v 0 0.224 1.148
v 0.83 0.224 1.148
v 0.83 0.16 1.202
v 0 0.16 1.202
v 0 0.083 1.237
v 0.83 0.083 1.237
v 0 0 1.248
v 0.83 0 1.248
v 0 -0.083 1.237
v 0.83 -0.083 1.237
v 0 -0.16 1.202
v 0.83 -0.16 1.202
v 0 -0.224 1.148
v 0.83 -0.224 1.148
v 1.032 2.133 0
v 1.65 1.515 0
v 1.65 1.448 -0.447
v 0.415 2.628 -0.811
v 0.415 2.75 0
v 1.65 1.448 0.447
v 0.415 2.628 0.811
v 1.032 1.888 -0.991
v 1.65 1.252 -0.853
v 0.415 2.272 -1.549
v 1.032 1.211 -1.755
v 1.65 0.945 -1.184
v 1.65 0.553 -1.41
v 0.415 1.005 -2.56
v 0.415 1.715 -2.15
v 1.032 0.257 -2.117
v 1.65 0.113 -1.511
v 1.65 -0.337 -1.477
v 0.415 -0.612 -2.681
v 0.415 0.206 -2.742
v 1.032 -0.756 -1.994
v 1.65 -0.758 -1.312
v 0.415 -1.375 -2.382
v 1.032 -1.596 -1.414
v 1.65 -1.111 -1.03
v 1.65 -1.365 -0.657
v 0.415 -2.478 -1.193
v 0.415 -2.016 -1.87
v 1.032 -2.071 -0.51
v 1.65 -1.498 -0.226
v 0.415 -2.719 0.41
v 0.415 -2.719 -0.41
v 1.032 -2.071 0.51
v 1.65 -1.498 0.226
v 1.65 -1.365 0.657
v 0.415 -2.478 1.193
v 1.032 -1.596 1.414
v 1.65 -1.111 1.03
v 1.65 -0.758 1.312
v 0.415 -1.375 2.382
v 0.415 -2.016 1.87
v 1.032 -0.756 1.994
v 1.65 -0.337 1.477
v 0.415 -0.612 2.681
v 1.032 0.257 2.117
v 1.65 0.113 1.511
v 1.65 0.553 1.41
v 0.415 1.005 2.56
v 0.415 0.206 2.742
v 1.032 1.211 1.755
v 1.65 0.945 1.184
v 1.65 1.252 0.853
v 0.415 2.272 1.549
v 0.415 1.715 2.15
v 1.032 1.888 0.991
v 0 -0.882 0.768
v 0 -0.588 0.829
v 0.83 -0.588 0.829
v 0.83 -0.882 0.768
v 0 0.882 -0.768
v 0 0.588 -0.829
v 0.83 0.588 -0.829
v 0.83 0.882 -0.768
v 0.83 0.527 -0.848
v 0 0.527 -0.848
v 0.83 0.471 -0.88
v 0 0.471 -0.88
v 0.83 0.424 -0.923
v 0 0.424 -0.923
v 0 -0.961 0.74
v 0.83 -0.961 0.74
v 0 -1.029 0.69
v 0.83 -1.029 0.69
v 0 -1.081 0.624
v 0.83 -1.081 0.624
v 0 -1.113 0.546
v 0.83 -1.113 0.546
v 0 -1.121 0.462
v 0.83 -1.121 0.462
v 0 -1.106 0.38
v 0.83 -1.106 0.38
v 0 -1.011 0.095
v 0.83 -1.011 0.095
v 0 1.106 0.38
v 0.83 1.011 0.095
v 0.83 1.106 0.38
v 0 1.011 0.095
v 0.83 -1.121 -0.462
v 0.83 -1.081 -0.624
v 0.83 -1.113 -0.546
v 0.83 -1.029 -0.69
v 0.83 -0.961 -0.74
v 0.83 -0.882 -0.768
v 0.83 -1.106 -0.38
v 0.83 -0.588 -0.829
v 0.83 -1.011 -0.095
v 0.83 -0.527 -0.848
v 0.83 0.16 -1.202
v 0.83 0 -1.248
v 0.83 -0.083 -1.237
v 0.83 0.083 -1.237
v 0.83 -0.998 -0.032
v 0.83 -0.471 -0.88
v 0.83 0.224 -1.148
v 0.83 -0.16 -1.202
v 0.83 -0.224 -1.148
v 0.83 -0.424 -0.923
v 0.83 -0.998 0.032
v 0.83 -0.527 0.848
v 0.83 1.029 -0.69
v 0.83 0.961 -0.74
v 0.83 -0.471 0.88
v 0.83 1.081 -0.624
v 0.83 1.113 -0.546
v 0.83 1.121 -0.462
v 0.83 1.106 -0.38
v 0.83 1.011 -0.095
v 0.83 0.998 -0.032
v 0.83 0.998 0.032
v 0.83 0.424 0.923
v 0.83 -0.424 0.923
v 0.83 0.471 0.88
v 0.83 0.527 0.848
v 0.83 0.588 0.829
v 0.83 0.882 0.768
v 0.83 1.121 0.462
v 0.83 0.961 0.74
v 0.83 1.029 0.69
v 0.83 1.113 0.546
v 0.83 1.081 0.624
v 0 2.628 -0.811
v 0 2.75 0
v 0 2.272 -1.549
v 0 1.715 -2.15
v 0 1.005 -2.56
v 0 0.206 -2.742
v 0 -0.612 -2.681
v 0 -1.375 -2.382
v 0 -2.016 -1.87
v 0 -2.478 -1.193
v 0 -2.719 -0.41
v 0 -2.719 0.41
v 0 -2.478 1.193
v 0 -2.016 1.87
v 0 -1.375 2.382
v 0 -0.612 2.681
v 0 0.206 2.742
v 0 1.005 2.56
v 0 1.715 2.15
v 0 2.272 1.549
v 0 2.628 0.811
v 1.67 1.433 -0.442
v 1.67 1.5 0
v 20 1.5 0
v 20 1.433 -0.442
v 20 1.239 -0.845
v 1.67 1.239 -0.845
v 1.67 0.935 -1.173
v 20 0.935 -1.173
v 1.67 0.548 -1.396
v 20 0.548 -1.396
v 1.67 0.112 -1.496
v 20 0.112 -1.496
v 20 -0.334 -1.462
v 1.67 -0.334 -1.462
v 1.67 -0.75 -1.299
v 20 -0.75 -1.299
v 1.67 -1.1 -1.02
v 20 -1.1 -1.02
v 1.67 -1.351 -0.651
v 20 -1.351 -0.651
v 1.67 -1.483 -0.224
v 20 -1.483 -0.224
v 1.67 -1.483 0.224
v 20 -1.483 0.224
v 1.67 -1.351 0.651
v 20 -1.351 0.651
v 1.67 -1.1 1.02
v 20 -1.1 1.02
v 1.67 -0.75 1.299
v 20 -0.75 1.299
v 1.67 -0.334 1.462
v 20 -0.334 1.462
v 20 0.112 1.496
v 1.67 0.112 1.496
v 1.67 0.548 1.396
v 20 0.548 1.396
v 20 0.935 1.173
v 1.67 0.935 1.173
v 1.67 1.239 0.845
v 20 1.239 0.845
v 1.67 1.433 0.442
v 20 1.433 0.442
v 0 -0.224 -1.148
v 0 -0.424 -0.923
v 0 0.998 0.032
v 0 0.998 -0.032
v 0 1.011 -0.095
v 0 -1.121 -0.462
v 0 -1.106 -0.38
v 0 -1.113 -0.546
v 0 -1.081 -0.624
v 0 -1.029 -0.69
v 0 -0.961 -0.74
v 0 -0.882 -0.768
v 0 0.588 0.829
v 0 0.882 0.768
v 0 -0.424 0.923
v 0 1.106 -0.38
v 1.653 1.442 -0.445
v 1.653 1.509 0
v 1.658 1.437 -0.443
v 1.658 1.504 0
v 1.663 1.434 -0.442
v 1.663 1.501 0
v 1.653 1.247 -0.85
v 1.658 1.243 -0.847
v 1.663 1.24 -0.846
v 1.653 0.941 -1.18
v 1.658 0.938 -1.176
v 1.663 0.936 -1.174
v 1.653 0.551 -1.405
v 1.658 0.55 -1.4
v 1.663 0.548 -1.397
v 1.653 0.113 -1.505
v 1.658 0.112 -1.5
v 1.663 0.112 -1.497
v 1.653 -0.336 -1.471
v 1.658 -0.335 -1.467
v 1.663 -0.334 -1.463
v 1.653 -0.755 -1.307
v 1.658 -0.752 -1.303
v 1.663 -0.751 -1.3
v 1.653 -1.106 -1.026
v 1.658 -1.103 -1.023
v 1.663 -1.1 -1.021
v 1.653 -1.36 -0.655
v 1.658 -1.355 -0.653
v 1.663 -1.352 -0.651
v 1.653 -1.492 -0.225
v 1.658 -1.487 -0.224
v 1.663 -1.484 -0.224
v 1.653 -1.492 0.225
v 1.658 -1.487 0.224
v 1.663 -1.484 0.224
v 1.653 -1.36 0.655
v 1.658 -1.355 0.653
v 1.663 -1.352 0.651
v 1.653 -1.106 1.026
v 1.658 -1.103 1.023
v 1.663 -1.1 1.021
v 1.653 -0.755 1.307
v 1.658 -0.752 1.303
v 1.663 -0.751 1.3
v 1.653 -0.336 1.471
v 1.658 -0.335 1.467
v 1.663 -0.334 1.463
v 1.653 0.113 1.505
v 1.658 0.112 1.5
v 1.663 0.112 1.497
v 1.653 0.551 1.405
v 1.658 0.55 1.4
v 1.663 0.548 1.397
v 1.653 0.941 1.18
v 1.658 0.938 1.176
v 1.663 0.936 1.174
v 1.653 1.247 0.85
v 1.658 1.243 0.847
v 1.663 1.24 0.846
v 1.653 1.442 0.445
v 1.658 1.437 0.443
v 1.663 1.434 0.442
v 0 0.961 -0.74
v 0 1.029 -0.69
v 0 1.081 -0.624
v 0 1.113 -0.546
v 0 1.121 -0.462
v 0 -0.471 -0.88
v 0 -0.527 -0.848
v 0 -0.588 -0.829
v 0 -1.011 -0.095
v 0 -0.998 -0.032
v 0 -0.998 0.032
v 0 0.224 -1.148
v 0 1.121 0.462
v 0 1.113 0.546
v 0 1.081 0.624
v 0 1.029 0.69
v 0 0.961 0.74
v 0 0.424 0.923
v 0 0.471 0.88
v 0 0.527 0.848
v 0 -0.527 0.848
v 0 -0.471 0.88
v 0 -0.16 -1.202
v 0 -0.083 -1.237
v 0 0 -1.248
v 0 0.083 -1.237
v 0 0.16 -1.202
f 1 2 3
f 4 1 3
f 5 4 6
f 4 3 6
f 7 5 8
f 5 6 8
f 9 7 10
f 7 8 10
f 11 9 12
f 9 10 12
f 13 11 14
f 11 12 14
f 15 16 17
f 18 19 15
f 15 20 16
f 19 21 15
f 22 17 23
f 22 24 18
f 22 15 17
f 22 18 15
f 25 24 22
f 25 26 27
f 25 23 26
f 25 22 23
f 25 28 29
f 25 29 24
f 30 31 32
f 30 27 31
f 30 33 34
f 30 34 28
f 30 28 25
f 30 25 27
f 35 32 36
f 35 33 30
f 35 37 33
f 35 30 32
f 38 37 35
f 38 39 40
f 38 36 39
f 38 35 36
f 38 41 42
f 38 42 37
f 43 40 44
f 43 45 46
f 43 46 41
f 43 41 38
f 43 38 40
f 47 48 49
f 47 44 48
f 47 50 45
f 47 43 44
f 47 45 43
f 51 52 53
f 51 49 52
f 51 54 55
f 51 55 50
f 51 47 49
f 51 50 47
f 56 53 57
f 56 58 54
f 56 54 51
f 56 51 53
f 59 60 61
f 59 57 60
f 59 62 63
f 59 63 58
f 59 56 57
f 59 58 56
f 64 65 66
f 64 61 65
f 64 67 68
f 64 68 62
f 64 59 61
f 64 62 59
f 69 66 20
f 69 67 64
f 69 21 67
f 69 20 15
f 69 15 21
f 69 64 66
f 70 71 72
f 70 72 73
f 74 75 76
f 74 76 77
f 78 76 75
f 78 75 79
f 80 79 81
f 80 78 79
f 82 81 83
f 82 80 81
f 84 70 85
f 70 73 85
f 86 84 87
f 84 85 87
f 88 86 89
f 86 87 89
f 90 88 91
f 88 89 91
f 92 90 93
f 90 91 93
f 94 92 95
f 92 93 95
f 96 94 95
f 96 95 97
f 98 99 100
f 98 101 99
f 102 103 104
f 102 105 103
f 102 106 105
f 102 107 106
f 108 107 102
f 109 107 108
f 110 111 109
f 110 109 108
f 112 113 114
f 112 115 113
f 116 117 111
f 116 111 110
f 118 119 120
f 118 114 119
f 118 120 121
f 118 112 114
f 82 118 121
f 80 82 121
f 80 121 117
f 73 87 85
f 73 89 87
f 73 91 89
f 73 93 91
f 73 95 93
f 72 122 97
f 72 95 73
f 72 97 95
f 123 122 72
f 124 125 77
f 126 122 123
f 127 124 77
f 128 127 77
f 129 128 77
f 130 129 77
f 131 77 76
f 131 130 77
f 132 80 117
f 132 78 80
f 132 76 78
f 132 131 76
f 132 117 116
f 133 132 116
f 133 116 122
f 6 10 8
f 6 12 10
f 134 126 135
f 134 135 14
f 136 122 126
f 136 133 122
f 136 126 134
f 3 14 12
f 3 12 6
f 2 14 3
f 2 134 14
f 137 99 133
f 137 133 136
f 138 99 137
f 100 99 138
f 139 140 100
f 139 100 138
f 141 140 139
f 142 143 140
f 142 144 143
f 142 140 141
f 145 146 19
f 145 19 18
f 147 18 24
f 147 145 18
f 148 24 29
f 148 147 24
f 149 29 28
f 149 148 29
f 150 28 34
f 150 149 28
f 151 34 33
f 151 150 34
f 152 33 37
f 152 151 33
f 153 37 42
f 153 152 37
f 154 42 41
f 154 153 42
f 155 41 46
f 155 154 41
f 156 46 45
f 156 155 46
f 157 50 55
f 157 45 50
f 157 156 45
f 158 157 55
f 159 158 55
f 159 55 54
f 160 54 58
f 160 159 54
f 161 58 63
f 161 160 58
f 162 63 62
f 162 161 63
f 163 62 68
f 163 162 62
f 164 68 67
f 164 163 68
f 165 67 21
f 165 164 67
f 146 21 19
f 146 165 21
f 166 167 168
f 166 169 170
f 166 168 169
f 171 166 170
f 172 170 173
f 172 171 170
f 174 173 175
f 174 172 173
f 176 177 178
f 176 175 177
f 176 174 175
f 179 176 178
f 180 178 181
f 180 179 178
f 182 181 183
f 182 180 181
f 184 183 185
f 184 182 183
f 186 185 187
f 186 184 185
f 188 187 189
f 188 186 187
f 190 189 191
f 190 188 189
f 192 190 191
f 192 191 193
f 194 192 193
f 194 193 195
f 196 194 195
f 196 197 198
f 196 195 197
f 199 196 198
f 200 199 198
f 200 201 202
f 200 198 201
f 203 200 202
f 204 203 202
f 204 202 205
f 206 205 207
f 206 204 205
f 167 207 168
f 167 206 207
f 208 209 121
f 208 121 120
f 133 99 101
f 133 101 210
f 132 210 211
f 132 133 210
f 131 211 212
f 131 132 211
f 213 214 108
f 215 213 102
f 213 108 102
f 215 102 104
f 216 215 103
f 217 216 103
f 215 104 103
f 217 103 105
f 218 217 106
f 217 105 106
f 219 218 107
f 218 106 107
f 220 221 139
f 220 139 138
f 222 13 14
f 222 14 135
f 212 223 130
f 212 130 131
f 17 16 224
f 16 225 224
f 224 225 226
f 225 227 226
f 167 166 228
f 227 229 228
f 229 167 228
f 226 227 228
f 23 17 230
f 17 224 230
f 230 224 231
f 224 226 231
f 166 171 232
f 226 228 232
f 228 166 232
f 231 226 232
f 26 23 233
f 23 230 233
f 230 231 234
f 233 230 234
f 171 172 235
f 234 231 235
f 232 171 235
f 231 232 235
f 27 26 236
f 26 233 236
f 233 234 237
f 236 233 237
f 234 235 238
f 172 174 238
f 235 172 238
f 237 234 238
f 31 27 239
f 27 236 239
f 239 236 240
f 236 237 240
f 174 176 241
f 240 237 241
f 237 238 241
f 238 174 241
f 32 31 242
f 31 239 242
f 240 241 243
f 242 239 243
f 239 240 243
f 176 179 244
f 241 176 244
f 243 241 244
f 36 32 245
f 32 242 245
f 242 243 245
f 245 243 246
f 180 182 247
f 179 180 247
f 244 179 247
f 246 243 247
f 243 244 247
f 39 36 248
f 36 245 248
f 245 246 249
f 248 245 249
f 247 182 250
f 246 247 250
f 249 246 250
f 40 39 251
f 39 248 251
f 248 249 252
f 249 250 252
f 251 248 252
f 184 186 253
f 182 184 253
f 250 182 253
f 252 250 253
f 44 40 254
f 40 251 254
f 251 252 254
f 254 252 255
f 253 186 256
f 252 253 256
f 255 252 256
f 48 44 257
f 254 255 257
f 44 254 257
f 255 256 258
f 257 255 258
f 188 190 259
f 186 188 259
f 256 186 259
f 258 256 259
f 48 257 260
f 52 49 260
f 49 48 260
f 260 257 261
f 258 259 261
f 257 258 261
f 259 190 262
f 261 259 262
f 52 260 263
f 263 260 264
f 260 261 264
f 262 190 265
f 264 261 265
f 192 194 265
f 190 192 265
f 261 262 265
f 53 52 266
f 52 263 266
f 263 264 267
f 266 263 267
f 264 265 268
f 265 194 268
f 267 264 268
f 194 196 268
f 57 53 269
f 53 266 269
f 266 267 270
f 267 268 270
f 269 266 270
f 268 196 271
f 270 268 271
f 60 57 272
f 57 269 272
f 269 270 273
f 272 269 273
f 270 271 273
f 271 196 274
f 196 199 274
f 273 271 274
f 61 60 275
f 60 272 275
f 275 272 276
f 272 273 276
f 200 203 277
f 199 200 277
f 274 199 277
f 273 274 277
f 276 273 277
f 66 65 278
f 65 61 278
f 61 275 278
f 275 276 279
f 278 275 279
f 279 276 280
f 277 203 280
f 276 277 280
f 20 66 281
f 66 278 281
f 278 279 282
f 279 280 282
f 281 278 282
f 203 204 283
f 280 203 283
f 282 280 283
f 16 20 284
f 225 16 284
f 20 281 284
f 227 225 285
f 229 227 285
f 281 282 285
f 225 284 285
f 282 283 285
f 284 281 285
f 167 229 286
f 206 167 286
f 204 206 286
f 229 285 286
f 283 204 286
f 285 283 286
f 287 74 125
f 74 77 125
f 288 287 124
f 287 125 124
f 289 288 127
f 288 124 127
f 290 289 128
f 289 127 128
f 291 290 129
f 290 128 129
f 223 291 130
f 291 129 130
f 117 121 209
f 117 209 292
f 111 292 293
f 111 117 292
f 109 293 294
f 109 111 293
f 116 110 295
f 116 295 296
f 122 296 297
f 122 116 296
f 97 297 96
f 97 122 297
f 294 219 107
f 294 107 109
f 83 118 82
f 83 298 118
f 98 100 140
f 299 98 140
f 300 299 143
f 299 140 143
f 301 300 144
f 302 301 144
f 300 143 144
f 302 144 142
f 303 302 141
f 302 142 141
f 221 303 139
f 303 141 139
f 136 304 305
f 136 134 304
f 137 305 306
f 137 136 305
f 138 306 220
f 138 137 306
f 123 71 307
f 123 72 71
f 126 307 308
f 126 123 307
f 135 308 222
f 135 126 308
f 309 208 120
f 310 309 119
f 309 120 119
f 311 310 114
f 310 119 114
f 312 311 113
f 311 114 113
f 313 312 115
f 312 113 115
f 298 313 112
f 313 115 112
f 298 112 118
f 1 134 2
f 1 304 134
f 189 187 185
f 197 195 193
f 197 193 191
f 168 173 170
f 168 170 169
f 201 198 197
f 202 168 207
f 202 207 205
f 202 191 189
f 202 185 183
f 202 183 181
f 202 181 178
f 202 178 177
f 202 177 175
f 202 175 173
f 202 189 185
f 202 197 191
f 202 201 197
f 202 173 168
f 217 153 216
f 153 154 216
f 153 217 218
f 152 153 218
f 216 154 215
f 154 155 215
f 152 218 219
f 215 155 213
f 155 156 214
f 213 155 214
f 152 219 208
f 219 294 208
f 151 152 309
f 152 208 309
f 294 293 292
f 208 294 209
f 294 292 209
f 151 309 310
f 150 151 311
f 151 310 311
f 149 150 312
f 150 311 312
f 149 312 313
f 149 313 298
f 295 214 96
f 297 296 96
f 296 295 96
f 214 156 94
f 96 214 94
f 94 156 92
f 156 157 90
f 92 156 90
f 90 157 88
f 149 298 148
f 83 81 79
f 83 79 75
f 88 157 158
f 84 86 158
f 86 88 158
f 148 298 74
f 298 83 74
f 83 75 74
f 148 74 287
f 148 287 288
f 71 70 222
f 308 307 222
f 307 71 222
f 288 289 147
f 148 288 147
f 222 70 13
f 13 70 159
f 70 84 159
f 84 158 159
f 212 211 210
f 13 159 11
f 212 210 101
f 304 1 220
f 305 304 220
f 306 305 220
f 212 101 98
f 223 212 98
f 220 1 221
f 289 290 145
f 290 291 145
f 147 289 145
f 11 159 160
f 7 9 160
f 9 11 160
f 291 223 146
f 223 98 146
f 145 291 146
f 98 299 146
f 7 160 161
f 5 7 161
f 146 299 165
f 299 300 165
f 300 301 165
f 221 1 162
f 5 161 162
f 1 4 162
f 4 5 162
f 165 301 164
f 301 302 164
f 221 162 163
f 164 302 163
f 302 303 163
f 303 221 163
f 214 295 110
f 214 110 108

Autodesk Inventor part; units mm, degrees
ref_plane "YZ Plane" through (0, 0, 0) normal (1, 0, 0) x (0, 1, 0)
ref_plane "XZ Plane" through (0, 0, 0) normal (0, 1, 0) x (-1, 0, 0)
ref_plane "XY Plane" through (0, 0, 0) normal (0, 0, 1) x (1, 0, 0)
sketch "Sketch1" plane through (0, 0, 0) normal (0, 0, 1) x (1, 0, 0)
  line L0 (0, 0) -> (20, 0)
  line L1 (20, 0) -> (20, 1.5)
  line L2 (20, 1.5) -> (2.35, 1.5)
  line L3 (2.35, 1.5) -> (2.15, 1.5)
  line L4 (2.15, 1.5) -> (1.67, 1.5)
  line L5 (1.65, 1.515) -> (1.65, 1.515)
  line L6 (1.65, 1.515) -> (0.415, 2.75)
  line L7 (0.415, 2.75) -> (0, 2.75)
  line L8 (0, 2.75) -> (0, 0)
  line L9 (1.65, 1.515) -> (1.65, 1.52)
  arc A0 (1.65, 1.52) -> (1.67, 1.5) centre (1.67, 1.52) ccw
  dimension "d17" = 20
  dimension "d18" = 0.415
  dimension "d19" = 1.65
  dimension "d20" = 0
  dimension "d21" = 5.5
  dimension "d22" = 3
  dimension "d23" = 3
  dimension "d25" = 45
  dimension "d26" = 0.2
  dimension "d28" = 0.02
  dimension "d29" = 17.65
  dimension "d30" = 0.02
  dimension "d52" = 0.7
revolve "Revolution1" add sketch "Sketch1" angle 360 about axis through (0, 0, 0) along (1, 0, 0)
thread "Thread1" size "M3x0.5" class "6g" standard "ISO Metric profile" length 17.65
sketch "Sketch2" plane through (0, 0, 0) normal (-1, 0, 0) x (0, 0, 1)
  circle A0 centre (0, 0) radius 1.4 construction
  circle A1 centre (0, 0) radius 0.98 construction
  line L0 (0, 0) -> (0.8487, 0.49)
  line L1 (0, 0) -> (0.98, 0) construction
  line L2 (0, 0) -> (0.8487, -0.49)
  line L3 (0, 0) -> (0.98, 0) construction
  line L4 (0.8487, 0.49) -> (1.4, 0)
  line L5 (1.4, 0) -> (0.8487, -0.49)
  dimension "d34" = 2.8
  dimension "d35" = 1.96
  dimension "d39" = 30
  dimension "d40" = 330
extrude "Extrusion1" cut sketch "Sketch2" against normal blind 0.83
pattern_circular "Circular Pattern1" count 6 over 360 about axis through (-10, 0, 0) along (1, 0, 0) of "Extrusion1"
fillet "Fillet1" radius 0.3 12 edges at (0.415, 0.49, 0.8487) (0.415, 0, 1.4) (0.415, -0.49, 0.8487) (0.415, -0.98, 0) (0.415, -1.2124, 0.7) (0.415, -1.2124, -0.7) (0.415, -0.49, -0.8487) (0.415, 0, -1.4) (0.415, 0.49, -0.8487) (0.415, 1.2124, -0.7) (0.415, 0.98, 0) (0.415, 1.2124, 0.7)
equation "\"d32\" = b"
equation "\"d34\" = A_"
equation "\"d35\" = 0.7 * A_"
equation "\"d43\" = t"
equation "\"d48\" = v"
equation "\"d17\" = l_"
equation "\"d18\" = 0.5 * t"
equation "\"d19\" = k"
equation "\"d21\" = dk"
equation "\"d22\" = d"
equation "\"d23\" = ds_"
equation "\"d25\" = 0.5 * headAngle"
equation "\"d26\" = x"
equation "\"d28\" = r"
equation "\"d29\" = b"
equation "\"b\" = 17.65"
equation "\"A_\" = 2.8"
equation "\"t\" = 0.83"
equation "\"v\" = 0.3"
equation "\"l_\" = 20"
equation "\"k\" = 1.65"
equation "\"dk\" = 5.5"
equation "\"d\" = 3"
equation "\"ds_\" = 3"
equation "\"headAngle\" = 90deg"
equation "\"x\" = 0.2"
equation "\"r\" = 0.02"
properties part number "Šroub se zápustnou hlavou a šestiramennou drážkou ISO 14581 - M3x20-4.8" material "Ocel, měkká"
